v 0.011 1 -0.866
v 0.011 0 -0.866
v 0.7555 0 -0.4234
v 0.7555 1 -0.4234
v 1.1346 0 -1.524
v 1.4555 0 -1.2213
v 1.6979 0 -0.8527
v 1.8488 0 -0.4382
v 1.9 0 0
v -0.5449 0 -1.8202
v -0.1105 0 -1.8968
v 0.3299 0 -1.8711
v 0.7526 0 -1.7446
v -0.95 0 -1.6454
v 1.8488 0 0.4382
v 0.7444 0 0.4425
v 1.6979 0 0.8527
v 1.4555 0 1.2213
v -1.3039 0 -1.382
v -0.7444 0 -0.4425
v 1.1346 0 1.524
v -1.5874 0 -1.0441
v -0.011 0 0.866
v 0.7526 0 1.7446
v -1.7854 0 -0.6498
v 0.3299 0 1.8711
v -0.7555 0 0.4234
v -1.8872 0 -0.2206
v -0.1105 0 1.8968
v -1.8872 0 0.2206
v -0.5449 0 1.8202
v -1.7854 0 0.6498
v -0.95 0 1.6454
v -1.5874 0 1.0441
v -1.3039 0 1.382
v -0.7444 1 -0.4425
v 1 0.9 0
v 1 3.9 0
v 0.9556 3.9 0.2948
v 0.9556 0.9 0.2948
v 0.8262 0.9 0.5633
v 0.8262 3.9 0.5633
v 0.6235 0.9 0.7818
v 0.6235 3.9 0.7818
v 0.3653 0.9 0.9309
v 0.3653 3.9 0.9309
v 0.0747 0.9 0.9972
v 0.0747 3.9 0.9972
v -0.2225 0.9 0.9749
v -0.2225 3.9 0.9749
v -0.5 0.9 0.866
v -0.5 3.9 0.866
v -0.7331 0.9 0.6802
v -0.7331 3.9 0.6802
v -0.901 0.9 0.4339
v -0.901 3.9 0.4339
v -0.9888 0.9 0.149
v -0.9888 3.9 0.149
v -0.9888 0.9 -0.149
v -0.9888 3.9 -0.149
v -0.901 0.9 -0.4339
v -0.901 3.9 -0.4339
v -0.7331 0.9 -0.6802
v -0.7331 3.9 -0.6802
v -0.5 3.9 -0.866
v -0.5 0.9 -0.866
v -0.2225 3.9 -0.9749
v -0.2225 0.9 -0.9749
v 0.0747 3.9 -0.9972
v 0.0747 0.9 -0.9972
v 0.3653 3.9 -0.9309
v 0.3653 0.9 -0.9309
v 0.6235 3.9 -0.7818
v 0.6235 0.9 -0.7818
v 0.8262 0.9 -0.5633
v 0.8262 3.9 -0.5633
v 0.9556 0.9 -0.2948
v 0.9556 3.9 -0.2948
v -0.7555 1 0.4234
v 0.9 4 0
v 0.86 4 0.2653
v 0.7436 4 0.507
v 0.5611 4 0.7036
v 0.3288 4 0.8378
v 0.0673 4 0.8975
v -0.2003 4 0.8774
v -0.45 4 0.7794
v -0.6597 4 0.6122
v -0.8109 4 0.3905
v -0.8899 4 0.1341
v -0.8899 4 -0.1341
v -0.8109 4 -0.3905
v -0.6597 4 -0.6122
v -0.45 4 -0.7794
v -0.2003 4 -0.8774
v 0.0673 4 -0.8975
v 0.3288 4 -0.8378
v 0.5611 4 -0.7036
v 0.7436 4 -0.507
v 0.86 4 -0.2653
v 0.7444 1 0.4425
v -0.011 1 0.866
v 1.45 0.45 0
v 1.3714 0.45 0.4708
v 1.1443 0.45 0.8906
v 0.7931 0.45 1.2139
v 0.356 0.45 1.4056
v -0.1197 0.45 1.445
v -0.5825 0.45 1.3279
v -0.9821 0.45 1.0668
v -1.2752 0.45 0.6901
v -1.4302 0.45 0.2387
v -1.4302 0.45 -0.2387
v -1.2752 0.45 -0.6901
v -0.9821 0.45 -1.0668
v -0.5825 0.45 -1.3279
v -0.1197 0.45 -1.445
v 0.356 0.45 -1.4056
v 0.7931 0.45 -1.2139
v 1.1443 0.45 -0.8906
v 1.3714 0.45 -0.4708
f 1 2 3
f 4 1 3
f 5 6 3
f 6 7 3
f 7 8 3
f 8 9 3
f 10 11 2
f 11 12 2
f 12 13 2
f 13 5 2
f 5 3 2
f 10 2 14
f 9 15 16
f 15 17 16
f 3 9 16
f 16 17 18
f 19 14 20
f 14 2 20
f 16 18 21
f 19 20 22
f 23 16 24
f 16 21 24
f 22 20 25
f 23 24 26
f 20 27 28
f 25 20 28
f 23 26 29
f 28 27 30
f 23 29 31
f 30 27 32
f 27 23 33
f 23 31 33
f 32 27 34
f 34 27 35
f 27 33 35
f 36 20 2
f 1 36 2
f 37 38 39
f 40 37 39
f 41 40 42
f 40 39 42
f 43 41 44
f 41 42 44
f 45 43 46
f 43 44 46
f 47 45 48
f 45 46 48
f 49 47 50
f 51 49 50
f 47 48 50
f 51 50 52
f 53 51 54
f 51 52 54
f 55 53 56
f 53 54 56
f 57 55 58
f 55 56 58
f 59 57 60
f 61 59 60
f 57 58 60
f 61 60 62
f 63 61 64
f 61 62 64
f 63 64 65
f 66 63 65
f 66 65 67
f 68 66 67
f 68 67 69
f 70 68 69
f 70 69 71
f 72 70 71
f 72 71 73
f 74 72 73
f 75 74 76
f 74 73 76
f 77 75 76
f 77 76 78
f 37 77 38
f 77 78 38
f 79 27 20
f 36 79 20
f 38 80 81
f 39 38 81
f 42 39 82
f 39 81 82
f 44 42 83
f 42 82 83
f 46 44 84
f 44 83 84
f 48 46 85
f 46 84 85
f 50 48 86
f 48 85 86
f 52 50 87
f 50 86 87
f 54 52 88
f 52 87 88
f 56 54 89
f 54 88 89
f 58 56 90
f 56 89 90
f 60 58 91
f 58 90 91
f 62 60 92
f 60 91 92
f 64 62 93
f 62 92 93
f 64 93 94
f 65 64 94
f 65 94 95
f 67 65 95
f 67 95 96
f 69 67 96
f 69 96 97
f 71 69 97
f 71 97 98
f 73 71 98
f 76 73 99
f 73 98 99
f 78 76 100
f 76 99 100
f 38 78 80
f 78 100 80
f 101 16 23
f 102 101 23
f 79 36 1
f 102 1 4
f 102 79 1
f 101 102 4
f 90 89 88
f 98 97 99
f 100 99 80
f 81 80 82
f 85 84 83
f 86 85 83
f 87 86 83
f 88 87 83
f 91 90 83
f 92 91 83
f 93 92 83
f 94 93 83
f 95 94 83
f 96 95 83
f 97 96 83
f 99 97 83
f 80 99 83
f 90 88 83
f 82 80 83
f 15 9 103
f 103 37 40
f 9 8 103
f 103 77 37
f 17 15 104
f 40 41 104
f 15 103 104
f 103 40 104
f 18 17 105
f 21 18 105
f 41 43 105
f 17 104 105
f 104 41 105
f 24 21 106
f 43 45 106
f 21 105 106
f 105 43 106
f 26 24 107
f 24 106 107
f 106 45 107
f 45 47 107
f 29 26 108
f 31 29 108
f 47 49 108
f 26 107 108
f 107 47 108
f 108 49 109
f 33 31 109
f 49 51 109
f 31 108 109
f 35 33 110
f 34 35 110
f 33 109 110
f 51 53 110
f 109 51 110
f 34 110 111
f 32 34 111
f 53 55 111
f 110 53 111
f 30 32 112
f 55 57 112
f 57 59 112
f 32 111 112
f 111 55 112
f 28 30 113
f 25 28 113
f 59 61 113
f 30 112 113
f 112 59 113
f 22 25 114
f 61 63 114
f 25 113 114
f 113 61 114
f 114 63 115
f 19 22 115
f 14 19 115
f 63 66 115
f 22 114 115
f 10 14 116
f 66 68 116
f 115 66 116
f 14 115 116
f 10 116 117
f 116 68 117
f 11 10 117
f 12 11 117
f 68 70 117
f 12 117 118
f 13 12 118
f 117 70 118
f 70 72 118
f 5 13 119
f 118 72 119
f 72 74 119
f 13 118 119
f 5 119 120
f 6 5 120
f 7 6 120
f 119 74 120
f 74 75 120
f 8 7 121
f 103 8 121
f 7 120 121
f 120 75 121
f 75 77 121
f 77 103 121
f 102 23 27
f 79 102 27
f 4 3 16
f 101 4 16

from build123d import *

# Parameters (mm, degrees)
SCHNITT_LINEAR_AUSTRAGEN1_DEPTH = 1
FASE1_SIZE                      = 0.1


with BuildPart() as part:
    # Skizze1 → Rotation1 (revolve)
    with BuildSketch(Plane.XY):
        Polygon((0, 0), (1.9, 0), (1, 0.9), (1, 4), (0, 4), align=None)
    revolve(axis=Axis((0, 4, 0), (0, -1, 0)))

    # Skizze2 → Schnitt-Linear austragen1 (cut)
    with BuildSketch(Plane.XZ):
        Polygon((0.75545515, -0.423423566), (0.74442314, 0.442531568), (-0.01103201, 0.865955134), (-0.75545515, 0.423423566), (-0.74442314, -0.442531568), (0.01103201, -0.865955134), align=None)
    extrude(amount=-SCHNITT_LINEAR_AUSTRAGEN1_DEPTH, mode=Mode.SUBTRACT)

    # Fase1
    fase1_edges = [part.edges().sort_by_distance(p)[0] for p in [
        (-1, 4, 0),
    ]]
    chamfer(fase1_edges, length=FASE1_SIZE)


solid = part.part
